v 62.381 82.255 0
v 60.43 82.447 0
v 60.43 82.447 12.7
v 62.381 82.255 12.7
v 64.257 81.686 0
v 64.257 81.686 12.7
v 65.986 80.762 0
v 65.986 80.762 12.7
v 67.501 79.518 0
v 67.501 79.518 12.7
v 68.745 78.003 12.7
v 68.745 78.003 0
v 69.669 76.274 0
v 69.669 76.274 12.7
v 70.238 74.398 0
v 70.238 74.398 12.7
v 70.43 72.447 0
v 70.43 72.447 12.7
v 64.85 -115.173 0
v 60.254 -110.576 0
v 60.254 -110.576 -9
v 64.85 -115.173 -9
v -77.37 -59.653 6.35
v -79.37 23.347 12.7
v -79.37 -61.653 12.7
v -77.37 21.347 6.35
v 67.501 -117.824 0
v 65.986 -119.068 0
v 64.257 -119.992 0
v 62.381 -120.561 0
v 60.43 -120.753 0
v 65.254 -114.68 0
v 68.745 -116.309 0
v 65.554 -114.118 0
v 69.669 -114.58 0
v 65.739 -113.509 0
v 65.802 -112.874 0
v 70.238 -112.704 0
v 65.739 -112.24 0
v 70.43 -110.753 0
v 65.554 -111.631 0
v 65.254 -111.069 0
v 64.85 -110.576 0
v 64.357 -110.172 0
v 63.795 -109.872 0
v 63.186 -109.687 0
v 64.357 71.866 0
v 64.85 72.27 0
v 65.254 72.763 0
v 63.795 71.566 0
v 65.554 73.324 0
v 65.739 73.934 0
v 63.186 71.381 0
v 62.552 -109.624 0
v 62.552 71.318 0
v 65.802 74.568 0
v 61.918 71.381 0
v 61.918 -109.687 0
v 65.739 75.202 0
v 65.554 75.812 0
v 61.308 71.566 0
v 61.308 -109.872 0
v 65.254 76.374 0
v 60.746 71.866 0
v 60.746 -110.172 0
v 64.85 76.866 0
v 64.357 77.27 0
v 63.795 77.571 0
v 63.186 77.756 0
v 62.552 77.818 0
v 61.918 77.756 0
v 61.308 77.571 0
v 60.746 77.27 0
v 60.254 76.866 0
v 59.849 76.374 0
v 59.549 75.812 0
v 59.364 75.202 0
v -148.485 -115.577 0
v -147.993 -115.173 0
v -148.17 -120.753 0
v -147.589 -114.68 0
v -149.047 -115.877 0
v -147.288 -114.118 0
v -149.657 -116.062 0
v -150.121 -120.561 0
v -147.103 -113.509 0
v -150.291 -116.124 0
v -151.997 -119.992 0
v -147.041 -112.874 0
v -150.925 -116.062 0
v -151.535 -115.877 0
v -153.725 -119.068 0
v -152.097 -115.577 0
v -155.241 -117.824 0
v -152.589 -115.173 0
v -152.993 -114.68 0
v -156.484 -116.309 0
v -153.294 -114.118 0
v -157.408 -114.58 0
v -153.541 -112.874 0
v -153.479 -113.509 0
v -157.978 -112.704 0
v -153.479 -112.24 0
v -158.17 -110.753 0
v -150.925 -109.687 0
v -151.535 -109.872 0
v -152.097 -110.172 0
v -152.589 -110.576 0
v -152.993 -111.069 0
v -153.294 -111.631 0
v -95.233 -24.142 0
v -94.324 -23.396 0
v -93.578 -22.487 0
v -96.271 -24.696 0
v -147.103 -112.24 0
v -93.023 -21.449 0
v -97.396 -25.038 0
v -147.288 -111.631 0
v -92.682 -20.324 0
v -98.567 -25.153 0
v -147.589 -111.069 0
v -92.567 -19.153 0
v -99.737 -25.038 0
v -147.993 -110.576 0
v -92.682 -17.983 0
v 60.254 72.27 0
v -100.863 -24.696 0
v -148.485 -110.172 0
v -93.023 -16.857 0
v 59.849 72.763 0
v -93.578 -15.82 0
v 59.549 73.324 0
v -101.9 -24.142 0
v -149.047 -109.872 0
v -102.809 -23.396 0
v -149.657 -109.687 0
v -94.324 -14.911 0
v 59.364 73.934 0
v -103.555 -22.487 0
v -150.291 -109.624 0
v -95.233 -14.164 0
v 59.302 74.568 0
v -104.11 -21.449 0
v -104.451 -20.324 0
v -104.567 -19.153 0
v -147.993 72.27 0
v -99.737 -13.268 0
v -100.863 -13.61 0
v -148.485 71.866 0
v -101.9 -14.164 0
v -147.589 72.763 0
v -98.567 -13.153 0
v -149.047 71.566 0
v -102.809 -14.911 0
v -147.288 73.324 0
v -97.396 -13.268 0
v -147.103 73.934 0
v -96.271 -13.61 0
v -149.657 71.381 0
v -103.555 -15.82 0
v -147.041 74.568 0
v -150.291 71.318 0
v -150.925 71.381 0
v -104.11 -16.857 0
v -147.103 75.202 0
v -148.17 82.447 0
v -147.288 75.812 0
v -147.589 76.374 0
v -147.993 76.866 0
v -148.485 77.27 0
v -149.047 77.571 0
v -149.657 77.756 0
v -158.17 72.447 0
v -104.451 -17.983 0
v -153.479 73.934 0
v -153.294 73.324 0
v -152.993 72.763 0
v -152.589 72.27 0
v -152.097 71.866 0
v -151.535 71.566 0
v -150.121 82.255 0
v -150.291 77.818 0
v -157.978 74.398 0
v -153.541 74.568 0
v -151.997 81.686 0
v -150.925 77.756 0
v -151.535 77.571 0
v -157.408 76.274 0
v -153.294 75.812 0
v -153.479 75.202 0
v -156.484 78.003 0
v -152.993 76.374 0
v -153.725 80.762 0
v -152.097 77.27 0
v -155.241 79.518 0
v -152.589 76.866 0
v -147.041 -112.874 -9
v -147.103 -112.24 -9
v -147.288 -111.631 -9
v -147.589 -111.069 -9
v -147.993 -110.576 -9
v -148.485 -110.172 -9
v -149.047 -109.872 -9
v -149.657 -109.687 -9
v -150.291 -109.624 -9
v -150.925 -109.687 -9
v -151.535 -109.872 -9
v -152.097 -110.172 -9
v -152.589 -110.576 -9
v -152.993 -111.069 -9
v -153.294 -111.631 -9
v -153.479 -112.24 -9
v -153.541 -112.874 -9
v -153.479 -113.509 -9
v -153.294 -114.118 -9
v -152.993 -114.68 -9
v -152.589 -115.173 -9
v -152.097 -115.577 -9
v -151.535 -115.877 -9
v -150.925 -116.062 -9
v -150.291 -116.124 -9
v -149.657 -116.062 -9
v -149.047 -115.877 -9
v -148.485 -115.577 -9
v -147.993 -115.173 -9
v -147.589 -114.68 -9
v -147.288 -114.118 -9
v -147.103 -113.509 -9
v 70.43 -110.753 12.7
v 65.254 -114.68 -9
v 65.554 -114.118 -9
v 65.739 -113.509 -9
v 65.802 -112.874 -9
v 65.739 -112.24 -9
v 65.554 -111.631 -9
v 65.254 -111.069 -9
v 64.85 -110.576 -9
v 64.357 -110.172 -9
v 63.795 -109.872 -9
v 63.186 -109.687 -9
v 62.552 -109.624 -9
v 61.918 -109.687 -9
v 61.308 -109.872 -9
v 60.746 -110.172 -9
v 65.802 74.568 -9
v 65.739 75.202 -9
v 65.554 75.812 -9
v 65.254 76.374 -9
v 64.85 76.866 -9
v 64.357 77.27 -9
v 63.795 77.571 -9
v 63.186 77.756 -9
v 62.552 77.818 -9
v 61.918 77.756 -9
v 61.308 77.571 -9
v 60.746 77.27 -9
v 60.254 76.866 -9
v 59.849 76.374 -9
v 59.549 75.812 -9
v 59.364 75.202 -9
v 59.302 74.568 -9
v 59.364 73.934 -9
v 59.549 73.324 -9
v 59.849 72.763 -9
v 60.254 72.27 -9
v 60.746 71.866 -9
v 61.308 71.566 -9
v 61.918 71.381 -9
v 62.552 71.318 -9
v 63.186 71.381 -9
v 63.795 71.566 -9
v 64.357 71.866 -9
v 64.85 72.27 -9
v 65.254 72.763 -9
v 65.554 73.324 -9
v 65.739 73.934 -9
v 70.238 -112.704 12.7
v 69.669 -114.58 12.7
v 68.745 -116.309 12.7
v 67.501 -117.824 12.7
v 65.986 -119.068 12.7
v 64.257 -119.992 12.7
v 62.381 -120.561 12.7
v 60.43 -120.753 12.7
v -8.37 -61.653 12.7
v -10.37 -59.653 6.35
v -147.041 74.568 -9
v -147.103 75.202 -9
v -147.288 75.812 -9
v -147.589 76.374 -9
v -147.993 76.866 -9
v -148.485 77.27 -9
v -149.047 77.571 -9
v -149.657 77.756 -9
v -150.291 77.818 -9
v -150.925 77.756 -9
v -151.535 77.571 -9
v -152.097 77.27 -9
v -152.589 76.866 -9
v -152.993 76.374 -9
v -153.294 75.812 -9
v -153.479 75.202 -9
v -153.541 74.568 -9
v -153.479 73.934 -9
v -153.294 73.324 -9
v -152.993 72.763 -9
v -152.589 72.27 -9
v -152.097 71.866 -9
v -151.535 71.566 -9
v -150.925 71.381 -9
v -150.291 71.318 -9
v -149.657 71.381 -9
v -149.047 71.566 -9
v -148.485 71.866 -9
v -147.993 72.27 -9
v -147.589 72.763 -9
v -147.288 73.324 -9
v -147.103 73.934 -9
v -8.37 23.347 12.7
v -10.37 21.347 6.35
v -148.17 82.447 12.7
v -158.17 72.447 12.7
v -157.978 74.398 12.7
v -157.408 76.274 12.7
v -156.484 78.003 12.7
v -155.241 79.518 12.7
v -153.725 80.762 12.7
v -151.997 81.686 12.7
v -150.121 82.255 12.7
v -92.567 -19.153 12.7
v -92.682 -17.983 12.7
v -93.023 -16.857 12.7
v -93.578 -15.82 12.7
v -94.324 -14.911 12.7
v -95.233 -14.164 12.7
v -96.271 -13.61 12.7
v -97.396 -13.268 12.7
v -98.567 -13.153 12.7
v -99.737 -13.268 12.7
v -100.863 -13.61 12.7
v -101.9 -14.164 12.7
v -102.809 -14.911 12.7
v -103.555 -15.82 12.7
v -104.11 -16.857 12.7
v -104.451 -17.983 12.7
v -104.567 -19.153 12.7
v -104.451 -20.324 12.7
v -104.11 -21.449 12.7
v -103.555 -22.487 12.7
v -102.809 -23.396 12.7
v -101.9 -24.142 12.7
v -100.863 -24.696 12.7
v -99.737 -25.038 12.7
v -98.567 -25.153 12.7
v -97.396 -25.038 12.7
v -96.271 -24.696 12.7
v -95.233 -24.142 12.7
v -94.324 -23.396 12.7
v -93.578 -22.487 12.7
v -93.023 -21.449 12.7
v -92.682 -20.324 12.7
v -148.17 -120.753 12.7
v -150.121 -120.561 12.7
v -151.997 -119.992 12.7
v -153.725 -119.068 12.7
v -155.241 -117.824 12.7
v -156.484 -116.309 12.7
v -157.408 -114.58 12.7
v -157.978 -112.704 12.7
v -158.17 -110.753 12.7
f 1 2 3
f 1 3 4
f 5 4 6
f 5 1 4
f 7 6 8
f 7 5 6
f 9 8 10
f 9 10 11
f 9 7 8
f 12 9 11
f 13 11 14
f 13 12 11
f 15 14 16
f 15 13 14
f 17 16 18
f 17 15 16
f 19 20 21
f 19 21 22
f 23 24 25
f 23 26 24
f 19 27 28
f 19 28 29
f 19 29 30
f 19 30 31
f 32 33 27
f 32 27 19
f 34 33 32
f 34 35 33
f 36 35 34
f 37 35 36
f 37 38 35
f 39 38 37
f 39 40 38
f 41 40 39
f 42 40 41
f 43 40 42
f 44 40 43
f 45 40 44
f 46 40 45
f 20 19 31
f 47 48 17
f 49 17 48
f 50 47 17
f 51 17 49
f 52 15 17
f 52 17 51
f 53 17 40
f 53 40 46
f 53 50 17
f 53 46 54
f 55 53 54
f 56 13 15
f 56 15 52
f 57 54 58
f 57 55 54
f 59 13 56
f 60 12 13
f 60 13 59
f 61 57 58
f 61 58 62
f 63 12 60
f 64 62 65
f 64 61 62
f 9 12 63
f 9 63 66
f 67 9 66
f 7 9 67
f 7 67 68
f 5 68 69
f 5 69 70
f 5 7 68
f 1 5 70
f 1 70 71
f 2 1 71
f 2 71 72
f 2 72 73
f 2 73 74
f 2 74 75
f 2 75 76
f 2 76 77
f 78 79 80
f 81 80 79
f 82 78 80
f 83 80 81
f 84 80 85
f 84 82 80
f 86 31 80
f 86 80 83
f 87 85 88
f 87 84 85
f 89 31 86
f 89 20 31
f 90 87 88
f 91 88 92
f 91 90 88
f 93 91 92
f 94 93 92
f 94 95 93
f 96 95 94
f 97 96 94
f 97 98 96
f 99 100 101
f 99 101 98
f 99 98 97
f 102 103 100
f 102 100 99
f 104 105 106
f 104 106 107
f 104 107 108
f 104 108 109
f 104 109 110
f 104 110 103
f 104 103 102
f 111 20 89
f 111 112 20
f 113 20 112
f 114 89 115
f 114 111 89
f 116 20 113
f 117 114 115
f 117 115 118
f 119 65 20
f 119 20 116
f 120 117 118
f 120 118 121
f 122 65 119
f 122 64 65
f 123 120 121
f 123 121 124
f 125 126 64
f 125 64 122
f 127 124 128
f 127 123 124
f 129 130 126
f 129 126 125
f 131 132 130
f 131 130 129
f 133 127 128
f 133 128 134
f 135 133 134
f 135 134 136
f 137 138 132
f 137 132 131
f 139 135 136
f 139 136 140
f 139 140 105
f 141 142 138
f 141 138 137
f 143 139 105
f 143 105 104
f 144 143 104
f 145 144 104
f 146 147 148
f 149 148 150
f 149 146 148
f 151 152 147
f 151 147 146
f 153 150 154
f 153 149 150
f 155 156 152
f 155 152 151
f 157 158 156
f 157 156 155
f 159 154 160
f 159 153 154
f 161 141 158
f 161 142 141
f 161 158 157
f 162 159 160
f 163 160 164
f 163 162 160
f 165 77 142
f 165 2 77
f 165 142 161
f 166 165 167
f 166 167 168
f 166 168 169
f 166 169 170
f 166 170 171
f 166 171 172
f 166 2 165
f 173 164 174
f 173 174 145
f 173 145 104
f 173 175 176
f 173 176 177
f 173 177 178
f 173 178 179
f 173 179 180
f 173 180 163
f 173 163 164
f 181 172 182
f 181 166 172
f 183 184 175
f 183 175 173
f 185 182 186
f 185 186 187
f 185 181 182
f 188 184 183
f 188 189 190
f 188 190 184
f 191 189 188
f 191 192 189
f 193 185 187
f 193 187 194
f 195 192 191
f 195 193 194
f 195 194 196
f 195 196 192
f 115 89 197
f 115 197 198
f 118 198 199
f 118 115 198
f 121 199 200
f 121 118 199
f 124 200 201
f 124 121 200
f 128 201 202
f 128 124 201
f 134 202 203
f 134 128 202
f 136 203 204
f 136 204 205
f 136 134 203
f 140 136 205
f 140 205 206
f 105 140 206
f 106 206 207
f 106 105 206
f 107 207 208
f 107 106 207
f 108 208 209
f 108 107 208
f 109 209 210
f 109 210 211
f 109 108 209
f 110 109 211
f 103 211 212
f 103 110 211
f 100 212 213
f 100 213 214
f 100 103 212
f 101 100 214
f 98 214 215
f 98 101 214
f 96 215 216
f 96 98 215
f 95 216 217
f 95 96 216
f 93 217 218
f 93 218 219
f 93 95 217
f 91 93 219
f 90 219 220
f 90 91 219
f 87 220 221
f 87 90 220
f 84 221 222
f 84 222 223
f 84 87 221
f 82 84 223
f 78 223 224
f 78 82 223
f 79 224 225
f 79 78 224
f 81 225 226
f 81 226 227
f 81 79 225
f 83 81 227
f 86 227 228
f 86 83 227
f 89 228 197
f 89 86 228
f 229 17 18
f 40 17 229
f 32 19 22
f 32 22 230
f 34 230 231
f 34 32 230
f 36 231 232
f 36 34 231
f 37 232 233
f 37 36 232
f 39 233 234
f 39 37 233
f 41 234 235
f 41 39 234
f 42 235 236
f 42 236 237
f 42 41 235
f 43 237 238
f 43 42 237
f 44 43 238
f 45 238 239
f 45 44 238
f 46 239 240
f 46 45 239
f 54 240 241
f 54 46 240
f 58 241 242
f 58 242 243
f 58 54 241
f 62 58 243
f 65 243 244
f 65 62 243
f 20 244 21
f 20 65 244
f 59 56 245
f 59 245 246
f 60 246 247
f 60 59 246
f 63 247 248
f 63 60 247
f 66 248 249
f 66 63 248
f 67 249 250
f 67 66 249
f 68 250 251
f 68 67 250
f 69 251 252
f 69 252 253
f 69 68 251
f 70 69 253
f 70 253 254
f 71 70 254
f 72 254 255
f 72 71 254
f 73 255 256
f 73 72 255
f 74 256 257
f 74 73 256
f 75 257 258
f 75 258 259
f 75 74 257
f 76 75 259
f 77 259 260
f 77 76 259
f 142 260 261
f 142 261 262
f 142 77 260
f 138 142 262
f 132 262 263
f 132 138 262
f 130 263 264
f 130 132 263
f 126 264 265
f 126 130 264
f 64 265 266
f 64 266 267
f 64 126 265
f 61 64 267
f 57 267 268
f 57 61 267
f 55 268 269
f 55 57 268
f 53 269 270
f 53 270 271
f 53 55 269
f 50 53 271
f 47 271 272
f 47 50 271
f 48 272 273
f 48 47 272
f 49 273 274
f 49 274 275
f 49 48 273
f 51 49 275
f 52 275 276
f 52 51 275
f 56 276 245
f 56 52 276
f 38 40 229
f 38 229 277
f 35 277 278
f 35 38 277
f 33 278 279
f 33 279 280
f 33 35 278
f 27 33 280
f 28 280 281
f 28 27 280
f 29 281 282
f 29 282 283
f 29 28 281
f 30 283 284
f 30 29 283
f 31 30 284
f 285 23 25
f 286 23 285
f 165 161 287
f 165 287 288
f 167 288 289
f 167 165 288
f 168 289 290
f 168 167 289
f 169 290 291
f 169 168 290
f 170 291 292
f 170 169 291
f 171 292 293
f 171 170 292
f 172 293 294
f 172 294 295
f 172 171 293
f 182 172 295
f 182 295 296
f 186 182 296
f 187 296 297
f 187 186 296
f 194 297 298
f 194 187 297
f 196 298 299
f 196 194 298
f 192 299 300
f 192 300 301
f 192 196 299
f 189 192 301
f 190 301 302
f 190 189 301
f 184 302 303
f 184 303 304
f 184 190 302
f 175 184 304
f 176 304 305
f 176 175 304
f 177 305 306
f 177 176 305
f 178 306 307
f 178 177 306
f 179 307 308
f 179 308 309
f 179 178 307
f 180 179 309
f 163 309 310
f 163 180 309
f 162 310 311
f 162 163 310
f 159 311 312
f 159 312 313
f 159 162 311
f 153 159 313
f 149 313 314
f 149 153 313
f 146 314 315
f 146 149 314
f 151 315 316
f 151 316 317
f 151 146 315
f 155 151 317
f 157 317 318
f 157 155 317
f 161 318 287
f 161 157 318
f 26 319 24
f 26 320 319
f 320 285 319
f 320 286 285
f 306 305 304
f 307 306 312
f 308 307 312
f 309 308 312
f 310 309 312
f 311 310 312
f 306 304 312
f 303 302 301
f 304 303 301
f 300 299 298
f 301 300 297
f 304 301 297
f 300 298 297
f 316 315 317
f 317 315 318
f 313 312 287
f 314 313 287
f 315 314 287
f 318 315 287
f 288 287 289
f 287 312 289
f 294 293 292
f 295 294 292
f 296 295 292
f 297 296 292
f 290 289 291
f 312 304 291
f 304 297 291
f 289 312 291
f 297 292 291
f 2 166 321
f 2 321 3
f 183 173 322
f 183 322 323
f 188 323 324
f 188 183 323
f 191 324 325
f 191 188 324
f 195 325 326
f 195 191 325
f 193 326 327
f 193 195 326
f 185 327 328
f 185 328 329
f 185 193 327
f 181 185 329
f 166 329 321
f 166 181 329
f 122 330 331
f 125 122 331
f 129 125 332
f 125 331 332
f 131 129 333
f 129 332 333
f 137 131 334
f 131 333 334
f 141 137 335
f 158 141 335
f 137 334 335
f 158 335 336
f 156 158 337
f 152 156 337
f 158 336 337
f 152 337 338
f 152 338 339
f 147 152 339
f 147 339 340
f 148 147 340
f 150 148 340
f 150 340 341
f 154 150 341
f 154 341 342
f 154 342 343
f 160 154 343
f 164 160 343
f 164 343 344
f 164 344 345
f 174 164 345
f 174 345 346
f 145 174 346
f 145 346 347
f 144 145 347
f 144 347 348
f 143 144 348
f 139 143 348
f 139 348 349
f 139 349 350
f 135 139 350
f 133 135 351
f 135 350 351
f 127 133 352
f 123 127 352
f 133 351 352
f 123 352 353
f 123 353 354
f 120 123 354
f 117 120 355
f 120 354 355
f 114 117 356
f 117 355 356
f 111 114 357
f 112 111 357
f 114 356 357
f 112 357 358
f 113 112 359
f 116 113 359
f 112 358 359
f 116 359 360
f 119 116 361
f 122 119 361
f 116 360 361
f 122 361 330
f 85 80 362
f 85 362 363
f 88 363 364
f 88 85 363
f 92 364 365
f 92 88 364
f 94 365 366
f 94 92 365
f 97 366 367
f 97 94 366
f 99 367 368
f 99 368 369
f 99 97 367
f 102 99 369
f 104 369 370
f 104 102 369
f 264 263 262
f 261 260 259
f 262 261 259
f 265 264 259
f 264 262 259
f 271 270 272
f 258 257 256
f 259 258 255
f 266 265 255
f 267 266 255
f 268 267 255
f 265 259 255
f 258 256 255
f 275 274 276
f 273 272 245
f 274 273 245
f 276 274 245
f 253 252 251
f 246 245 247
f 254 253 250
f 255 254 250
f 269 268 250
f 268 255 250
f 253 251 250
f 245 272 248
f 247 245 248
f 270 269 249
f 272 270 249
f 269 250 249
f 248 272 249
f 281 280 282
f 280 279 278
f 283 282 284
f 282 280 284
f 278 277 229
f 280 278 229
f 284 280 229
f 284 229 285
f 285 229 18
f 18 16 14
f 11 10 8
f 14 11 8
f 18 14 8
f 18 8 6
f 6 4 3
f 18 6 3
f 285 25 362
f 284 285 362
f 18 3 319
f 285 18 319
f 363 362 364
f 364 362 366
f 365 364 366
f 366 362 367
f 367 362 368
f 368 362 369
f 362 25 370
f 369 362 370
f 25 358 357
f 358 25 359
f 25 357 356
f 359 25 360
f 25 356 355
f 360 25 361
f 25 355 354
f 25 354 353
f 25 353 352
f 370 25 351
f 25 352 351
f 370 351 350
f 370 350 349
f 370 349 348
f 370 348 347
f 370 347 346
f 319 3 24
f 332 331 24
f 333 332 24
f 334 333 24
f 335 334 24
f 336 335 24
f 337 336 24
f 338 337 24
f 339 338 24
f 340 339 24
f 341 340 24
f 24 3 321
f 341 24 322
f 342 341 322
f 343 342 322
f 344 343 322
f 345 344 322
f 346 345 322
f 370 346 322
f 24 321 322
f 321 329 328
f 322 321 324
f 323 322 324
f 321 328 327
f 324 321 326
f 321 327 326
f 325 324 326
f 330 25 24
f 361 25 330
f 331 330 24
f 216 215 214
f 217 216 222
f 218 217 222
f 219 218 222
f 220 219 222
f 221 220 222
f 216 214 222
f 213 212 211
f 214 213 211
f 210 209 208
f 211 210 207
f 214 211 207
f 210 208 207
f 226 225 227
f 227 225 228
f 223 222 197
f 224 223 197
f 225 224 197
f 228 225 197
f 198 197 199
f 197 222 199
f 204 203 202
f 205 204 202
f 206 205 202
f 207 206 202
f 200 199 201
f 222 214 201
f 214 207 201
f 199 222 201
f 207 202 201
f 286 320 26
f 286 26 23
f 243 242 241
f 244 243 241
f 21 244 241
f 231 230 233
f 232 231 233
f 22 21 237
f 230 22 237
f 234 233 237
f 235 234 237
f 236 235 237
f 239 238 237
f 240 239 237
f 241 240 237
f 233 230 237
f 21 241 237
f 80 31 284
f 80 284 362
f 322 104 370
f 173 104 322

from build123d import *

# Parameters (mm, degrees)
LID_DEPTH           = 12.7
SKETCH2_R           = 3.25
CORNER_SHAFTS_DEPTH = 9
SKETCH9_R           = 6
WIRE_HOLE_DEPTH     = 201.174580316


with BuildPart() as part:
    # Sketch1 → Lid (new body)
    with BuildSketch(Plane(origin=(-2.566079358, -10, 0), x_dir=(1, 0, 0), z_dir=(0, 0, 1))):
        with BuildLine():
            Line((-145.603603604, 92.446846847), (62.996396396, 92.446846847))
            ThreePointArc((62.996396396, 92.446846847), (70.067464208, 89.517914659), (72.996396396, 82.446846847))
            Line((72.996396396, 82.446846847), (72.996396396, -100.753153153))
            ThreePointArc((72.996396396, -100.753153153), (70.067464208, -107.824220965), (62.996396396, -110.753153153))
            Line((62.996396396, -110.753153153), (-145.603603604, -110.753153153))
            ThreePointArc((-145.603603604, -110.753153153), (-152.674671415, -107.824220965), (-155.603603604, -100.753153153))
            Line((-155.603603604, -100.753153153), (-155.603603604, 82.446846847))
            ThreePointArc((-155.603603604, 82.446846847), (-152.674671415, 89.517914659), (-145.603603604, 92.446846847))
        make_face()
    extrude(amount=LID_DEPTH)

    # Sketch2 → Corner Shafts (add)
    with BuildSketch(Plane.XY):
        with BuildLine():
            Line((60.253540343, -110.576376458), (64.849734421, -115.172570536))
            ThreePointArc((64.849734421, -115.172570536), (64.849734421, -110.576376458), (60.253540343, -110.576376458))
        make_face()
        with Locations((-150.291003305, -112.874473497)):
            Circle(SKETCH2_R)
        with Locations((-150.291003305, 74.56816719)):
            Circle(SKETCH2_R)
        with Locations((62.551637382, 74.56816719)):
            Circle(SKETCH2_R)
    extrude(amount=-CORNER_SHAFTS_DEPTH)

    # Sketch8 → Kinect Loft Cut section 0
    with BuildSketch(Plane.XY.offset(12.7)):
        with BuildLine():
            Line((-8.369682962, 23.346846847), (-79.369682962, 23.346846847))
            Line((-79.369682962, 23.346846847), (-79.369682962, -61.653153153))
            Line((-79.369682962, -61.653153153), (-8.369682962, -61.653153153))
            Line((-8.369682962, -61.653153153), (-8.369682962, 23.346846847))
        make_face()
    # Base for Kinect → Kinect Loft Cut section 1
    with BuildSketch(Plane.XY.offset(6.35)):
        with BuildLine():
            Line((-10.369682962, 21.346846847), (-77.369682962, 21.346846847))
            Line((-77.369682962, 21.346846847), (-77.369682962, -59.653153153))
            Line((-77.369682962, -59.653153153), (-10.369682962, -59.653153153))
            Line((-10.369682962, -59.653153153), (-10.369682962, 21.346846847))
        make_face()
    loft(mode=Mode.SUBTRACT)

    # Sketch9 → Wire Hole (cut, through all)
    with BuildSketch(Plane.XY.offset(12.7)):
        with Locations((-98.566640815, -19.153153153)):
            Circle(SKETCH9_R)
    extrude(amount=-WIRE_HOLE_DEPTH, mode=Mode.SUBTRACT)


solid = part.part
